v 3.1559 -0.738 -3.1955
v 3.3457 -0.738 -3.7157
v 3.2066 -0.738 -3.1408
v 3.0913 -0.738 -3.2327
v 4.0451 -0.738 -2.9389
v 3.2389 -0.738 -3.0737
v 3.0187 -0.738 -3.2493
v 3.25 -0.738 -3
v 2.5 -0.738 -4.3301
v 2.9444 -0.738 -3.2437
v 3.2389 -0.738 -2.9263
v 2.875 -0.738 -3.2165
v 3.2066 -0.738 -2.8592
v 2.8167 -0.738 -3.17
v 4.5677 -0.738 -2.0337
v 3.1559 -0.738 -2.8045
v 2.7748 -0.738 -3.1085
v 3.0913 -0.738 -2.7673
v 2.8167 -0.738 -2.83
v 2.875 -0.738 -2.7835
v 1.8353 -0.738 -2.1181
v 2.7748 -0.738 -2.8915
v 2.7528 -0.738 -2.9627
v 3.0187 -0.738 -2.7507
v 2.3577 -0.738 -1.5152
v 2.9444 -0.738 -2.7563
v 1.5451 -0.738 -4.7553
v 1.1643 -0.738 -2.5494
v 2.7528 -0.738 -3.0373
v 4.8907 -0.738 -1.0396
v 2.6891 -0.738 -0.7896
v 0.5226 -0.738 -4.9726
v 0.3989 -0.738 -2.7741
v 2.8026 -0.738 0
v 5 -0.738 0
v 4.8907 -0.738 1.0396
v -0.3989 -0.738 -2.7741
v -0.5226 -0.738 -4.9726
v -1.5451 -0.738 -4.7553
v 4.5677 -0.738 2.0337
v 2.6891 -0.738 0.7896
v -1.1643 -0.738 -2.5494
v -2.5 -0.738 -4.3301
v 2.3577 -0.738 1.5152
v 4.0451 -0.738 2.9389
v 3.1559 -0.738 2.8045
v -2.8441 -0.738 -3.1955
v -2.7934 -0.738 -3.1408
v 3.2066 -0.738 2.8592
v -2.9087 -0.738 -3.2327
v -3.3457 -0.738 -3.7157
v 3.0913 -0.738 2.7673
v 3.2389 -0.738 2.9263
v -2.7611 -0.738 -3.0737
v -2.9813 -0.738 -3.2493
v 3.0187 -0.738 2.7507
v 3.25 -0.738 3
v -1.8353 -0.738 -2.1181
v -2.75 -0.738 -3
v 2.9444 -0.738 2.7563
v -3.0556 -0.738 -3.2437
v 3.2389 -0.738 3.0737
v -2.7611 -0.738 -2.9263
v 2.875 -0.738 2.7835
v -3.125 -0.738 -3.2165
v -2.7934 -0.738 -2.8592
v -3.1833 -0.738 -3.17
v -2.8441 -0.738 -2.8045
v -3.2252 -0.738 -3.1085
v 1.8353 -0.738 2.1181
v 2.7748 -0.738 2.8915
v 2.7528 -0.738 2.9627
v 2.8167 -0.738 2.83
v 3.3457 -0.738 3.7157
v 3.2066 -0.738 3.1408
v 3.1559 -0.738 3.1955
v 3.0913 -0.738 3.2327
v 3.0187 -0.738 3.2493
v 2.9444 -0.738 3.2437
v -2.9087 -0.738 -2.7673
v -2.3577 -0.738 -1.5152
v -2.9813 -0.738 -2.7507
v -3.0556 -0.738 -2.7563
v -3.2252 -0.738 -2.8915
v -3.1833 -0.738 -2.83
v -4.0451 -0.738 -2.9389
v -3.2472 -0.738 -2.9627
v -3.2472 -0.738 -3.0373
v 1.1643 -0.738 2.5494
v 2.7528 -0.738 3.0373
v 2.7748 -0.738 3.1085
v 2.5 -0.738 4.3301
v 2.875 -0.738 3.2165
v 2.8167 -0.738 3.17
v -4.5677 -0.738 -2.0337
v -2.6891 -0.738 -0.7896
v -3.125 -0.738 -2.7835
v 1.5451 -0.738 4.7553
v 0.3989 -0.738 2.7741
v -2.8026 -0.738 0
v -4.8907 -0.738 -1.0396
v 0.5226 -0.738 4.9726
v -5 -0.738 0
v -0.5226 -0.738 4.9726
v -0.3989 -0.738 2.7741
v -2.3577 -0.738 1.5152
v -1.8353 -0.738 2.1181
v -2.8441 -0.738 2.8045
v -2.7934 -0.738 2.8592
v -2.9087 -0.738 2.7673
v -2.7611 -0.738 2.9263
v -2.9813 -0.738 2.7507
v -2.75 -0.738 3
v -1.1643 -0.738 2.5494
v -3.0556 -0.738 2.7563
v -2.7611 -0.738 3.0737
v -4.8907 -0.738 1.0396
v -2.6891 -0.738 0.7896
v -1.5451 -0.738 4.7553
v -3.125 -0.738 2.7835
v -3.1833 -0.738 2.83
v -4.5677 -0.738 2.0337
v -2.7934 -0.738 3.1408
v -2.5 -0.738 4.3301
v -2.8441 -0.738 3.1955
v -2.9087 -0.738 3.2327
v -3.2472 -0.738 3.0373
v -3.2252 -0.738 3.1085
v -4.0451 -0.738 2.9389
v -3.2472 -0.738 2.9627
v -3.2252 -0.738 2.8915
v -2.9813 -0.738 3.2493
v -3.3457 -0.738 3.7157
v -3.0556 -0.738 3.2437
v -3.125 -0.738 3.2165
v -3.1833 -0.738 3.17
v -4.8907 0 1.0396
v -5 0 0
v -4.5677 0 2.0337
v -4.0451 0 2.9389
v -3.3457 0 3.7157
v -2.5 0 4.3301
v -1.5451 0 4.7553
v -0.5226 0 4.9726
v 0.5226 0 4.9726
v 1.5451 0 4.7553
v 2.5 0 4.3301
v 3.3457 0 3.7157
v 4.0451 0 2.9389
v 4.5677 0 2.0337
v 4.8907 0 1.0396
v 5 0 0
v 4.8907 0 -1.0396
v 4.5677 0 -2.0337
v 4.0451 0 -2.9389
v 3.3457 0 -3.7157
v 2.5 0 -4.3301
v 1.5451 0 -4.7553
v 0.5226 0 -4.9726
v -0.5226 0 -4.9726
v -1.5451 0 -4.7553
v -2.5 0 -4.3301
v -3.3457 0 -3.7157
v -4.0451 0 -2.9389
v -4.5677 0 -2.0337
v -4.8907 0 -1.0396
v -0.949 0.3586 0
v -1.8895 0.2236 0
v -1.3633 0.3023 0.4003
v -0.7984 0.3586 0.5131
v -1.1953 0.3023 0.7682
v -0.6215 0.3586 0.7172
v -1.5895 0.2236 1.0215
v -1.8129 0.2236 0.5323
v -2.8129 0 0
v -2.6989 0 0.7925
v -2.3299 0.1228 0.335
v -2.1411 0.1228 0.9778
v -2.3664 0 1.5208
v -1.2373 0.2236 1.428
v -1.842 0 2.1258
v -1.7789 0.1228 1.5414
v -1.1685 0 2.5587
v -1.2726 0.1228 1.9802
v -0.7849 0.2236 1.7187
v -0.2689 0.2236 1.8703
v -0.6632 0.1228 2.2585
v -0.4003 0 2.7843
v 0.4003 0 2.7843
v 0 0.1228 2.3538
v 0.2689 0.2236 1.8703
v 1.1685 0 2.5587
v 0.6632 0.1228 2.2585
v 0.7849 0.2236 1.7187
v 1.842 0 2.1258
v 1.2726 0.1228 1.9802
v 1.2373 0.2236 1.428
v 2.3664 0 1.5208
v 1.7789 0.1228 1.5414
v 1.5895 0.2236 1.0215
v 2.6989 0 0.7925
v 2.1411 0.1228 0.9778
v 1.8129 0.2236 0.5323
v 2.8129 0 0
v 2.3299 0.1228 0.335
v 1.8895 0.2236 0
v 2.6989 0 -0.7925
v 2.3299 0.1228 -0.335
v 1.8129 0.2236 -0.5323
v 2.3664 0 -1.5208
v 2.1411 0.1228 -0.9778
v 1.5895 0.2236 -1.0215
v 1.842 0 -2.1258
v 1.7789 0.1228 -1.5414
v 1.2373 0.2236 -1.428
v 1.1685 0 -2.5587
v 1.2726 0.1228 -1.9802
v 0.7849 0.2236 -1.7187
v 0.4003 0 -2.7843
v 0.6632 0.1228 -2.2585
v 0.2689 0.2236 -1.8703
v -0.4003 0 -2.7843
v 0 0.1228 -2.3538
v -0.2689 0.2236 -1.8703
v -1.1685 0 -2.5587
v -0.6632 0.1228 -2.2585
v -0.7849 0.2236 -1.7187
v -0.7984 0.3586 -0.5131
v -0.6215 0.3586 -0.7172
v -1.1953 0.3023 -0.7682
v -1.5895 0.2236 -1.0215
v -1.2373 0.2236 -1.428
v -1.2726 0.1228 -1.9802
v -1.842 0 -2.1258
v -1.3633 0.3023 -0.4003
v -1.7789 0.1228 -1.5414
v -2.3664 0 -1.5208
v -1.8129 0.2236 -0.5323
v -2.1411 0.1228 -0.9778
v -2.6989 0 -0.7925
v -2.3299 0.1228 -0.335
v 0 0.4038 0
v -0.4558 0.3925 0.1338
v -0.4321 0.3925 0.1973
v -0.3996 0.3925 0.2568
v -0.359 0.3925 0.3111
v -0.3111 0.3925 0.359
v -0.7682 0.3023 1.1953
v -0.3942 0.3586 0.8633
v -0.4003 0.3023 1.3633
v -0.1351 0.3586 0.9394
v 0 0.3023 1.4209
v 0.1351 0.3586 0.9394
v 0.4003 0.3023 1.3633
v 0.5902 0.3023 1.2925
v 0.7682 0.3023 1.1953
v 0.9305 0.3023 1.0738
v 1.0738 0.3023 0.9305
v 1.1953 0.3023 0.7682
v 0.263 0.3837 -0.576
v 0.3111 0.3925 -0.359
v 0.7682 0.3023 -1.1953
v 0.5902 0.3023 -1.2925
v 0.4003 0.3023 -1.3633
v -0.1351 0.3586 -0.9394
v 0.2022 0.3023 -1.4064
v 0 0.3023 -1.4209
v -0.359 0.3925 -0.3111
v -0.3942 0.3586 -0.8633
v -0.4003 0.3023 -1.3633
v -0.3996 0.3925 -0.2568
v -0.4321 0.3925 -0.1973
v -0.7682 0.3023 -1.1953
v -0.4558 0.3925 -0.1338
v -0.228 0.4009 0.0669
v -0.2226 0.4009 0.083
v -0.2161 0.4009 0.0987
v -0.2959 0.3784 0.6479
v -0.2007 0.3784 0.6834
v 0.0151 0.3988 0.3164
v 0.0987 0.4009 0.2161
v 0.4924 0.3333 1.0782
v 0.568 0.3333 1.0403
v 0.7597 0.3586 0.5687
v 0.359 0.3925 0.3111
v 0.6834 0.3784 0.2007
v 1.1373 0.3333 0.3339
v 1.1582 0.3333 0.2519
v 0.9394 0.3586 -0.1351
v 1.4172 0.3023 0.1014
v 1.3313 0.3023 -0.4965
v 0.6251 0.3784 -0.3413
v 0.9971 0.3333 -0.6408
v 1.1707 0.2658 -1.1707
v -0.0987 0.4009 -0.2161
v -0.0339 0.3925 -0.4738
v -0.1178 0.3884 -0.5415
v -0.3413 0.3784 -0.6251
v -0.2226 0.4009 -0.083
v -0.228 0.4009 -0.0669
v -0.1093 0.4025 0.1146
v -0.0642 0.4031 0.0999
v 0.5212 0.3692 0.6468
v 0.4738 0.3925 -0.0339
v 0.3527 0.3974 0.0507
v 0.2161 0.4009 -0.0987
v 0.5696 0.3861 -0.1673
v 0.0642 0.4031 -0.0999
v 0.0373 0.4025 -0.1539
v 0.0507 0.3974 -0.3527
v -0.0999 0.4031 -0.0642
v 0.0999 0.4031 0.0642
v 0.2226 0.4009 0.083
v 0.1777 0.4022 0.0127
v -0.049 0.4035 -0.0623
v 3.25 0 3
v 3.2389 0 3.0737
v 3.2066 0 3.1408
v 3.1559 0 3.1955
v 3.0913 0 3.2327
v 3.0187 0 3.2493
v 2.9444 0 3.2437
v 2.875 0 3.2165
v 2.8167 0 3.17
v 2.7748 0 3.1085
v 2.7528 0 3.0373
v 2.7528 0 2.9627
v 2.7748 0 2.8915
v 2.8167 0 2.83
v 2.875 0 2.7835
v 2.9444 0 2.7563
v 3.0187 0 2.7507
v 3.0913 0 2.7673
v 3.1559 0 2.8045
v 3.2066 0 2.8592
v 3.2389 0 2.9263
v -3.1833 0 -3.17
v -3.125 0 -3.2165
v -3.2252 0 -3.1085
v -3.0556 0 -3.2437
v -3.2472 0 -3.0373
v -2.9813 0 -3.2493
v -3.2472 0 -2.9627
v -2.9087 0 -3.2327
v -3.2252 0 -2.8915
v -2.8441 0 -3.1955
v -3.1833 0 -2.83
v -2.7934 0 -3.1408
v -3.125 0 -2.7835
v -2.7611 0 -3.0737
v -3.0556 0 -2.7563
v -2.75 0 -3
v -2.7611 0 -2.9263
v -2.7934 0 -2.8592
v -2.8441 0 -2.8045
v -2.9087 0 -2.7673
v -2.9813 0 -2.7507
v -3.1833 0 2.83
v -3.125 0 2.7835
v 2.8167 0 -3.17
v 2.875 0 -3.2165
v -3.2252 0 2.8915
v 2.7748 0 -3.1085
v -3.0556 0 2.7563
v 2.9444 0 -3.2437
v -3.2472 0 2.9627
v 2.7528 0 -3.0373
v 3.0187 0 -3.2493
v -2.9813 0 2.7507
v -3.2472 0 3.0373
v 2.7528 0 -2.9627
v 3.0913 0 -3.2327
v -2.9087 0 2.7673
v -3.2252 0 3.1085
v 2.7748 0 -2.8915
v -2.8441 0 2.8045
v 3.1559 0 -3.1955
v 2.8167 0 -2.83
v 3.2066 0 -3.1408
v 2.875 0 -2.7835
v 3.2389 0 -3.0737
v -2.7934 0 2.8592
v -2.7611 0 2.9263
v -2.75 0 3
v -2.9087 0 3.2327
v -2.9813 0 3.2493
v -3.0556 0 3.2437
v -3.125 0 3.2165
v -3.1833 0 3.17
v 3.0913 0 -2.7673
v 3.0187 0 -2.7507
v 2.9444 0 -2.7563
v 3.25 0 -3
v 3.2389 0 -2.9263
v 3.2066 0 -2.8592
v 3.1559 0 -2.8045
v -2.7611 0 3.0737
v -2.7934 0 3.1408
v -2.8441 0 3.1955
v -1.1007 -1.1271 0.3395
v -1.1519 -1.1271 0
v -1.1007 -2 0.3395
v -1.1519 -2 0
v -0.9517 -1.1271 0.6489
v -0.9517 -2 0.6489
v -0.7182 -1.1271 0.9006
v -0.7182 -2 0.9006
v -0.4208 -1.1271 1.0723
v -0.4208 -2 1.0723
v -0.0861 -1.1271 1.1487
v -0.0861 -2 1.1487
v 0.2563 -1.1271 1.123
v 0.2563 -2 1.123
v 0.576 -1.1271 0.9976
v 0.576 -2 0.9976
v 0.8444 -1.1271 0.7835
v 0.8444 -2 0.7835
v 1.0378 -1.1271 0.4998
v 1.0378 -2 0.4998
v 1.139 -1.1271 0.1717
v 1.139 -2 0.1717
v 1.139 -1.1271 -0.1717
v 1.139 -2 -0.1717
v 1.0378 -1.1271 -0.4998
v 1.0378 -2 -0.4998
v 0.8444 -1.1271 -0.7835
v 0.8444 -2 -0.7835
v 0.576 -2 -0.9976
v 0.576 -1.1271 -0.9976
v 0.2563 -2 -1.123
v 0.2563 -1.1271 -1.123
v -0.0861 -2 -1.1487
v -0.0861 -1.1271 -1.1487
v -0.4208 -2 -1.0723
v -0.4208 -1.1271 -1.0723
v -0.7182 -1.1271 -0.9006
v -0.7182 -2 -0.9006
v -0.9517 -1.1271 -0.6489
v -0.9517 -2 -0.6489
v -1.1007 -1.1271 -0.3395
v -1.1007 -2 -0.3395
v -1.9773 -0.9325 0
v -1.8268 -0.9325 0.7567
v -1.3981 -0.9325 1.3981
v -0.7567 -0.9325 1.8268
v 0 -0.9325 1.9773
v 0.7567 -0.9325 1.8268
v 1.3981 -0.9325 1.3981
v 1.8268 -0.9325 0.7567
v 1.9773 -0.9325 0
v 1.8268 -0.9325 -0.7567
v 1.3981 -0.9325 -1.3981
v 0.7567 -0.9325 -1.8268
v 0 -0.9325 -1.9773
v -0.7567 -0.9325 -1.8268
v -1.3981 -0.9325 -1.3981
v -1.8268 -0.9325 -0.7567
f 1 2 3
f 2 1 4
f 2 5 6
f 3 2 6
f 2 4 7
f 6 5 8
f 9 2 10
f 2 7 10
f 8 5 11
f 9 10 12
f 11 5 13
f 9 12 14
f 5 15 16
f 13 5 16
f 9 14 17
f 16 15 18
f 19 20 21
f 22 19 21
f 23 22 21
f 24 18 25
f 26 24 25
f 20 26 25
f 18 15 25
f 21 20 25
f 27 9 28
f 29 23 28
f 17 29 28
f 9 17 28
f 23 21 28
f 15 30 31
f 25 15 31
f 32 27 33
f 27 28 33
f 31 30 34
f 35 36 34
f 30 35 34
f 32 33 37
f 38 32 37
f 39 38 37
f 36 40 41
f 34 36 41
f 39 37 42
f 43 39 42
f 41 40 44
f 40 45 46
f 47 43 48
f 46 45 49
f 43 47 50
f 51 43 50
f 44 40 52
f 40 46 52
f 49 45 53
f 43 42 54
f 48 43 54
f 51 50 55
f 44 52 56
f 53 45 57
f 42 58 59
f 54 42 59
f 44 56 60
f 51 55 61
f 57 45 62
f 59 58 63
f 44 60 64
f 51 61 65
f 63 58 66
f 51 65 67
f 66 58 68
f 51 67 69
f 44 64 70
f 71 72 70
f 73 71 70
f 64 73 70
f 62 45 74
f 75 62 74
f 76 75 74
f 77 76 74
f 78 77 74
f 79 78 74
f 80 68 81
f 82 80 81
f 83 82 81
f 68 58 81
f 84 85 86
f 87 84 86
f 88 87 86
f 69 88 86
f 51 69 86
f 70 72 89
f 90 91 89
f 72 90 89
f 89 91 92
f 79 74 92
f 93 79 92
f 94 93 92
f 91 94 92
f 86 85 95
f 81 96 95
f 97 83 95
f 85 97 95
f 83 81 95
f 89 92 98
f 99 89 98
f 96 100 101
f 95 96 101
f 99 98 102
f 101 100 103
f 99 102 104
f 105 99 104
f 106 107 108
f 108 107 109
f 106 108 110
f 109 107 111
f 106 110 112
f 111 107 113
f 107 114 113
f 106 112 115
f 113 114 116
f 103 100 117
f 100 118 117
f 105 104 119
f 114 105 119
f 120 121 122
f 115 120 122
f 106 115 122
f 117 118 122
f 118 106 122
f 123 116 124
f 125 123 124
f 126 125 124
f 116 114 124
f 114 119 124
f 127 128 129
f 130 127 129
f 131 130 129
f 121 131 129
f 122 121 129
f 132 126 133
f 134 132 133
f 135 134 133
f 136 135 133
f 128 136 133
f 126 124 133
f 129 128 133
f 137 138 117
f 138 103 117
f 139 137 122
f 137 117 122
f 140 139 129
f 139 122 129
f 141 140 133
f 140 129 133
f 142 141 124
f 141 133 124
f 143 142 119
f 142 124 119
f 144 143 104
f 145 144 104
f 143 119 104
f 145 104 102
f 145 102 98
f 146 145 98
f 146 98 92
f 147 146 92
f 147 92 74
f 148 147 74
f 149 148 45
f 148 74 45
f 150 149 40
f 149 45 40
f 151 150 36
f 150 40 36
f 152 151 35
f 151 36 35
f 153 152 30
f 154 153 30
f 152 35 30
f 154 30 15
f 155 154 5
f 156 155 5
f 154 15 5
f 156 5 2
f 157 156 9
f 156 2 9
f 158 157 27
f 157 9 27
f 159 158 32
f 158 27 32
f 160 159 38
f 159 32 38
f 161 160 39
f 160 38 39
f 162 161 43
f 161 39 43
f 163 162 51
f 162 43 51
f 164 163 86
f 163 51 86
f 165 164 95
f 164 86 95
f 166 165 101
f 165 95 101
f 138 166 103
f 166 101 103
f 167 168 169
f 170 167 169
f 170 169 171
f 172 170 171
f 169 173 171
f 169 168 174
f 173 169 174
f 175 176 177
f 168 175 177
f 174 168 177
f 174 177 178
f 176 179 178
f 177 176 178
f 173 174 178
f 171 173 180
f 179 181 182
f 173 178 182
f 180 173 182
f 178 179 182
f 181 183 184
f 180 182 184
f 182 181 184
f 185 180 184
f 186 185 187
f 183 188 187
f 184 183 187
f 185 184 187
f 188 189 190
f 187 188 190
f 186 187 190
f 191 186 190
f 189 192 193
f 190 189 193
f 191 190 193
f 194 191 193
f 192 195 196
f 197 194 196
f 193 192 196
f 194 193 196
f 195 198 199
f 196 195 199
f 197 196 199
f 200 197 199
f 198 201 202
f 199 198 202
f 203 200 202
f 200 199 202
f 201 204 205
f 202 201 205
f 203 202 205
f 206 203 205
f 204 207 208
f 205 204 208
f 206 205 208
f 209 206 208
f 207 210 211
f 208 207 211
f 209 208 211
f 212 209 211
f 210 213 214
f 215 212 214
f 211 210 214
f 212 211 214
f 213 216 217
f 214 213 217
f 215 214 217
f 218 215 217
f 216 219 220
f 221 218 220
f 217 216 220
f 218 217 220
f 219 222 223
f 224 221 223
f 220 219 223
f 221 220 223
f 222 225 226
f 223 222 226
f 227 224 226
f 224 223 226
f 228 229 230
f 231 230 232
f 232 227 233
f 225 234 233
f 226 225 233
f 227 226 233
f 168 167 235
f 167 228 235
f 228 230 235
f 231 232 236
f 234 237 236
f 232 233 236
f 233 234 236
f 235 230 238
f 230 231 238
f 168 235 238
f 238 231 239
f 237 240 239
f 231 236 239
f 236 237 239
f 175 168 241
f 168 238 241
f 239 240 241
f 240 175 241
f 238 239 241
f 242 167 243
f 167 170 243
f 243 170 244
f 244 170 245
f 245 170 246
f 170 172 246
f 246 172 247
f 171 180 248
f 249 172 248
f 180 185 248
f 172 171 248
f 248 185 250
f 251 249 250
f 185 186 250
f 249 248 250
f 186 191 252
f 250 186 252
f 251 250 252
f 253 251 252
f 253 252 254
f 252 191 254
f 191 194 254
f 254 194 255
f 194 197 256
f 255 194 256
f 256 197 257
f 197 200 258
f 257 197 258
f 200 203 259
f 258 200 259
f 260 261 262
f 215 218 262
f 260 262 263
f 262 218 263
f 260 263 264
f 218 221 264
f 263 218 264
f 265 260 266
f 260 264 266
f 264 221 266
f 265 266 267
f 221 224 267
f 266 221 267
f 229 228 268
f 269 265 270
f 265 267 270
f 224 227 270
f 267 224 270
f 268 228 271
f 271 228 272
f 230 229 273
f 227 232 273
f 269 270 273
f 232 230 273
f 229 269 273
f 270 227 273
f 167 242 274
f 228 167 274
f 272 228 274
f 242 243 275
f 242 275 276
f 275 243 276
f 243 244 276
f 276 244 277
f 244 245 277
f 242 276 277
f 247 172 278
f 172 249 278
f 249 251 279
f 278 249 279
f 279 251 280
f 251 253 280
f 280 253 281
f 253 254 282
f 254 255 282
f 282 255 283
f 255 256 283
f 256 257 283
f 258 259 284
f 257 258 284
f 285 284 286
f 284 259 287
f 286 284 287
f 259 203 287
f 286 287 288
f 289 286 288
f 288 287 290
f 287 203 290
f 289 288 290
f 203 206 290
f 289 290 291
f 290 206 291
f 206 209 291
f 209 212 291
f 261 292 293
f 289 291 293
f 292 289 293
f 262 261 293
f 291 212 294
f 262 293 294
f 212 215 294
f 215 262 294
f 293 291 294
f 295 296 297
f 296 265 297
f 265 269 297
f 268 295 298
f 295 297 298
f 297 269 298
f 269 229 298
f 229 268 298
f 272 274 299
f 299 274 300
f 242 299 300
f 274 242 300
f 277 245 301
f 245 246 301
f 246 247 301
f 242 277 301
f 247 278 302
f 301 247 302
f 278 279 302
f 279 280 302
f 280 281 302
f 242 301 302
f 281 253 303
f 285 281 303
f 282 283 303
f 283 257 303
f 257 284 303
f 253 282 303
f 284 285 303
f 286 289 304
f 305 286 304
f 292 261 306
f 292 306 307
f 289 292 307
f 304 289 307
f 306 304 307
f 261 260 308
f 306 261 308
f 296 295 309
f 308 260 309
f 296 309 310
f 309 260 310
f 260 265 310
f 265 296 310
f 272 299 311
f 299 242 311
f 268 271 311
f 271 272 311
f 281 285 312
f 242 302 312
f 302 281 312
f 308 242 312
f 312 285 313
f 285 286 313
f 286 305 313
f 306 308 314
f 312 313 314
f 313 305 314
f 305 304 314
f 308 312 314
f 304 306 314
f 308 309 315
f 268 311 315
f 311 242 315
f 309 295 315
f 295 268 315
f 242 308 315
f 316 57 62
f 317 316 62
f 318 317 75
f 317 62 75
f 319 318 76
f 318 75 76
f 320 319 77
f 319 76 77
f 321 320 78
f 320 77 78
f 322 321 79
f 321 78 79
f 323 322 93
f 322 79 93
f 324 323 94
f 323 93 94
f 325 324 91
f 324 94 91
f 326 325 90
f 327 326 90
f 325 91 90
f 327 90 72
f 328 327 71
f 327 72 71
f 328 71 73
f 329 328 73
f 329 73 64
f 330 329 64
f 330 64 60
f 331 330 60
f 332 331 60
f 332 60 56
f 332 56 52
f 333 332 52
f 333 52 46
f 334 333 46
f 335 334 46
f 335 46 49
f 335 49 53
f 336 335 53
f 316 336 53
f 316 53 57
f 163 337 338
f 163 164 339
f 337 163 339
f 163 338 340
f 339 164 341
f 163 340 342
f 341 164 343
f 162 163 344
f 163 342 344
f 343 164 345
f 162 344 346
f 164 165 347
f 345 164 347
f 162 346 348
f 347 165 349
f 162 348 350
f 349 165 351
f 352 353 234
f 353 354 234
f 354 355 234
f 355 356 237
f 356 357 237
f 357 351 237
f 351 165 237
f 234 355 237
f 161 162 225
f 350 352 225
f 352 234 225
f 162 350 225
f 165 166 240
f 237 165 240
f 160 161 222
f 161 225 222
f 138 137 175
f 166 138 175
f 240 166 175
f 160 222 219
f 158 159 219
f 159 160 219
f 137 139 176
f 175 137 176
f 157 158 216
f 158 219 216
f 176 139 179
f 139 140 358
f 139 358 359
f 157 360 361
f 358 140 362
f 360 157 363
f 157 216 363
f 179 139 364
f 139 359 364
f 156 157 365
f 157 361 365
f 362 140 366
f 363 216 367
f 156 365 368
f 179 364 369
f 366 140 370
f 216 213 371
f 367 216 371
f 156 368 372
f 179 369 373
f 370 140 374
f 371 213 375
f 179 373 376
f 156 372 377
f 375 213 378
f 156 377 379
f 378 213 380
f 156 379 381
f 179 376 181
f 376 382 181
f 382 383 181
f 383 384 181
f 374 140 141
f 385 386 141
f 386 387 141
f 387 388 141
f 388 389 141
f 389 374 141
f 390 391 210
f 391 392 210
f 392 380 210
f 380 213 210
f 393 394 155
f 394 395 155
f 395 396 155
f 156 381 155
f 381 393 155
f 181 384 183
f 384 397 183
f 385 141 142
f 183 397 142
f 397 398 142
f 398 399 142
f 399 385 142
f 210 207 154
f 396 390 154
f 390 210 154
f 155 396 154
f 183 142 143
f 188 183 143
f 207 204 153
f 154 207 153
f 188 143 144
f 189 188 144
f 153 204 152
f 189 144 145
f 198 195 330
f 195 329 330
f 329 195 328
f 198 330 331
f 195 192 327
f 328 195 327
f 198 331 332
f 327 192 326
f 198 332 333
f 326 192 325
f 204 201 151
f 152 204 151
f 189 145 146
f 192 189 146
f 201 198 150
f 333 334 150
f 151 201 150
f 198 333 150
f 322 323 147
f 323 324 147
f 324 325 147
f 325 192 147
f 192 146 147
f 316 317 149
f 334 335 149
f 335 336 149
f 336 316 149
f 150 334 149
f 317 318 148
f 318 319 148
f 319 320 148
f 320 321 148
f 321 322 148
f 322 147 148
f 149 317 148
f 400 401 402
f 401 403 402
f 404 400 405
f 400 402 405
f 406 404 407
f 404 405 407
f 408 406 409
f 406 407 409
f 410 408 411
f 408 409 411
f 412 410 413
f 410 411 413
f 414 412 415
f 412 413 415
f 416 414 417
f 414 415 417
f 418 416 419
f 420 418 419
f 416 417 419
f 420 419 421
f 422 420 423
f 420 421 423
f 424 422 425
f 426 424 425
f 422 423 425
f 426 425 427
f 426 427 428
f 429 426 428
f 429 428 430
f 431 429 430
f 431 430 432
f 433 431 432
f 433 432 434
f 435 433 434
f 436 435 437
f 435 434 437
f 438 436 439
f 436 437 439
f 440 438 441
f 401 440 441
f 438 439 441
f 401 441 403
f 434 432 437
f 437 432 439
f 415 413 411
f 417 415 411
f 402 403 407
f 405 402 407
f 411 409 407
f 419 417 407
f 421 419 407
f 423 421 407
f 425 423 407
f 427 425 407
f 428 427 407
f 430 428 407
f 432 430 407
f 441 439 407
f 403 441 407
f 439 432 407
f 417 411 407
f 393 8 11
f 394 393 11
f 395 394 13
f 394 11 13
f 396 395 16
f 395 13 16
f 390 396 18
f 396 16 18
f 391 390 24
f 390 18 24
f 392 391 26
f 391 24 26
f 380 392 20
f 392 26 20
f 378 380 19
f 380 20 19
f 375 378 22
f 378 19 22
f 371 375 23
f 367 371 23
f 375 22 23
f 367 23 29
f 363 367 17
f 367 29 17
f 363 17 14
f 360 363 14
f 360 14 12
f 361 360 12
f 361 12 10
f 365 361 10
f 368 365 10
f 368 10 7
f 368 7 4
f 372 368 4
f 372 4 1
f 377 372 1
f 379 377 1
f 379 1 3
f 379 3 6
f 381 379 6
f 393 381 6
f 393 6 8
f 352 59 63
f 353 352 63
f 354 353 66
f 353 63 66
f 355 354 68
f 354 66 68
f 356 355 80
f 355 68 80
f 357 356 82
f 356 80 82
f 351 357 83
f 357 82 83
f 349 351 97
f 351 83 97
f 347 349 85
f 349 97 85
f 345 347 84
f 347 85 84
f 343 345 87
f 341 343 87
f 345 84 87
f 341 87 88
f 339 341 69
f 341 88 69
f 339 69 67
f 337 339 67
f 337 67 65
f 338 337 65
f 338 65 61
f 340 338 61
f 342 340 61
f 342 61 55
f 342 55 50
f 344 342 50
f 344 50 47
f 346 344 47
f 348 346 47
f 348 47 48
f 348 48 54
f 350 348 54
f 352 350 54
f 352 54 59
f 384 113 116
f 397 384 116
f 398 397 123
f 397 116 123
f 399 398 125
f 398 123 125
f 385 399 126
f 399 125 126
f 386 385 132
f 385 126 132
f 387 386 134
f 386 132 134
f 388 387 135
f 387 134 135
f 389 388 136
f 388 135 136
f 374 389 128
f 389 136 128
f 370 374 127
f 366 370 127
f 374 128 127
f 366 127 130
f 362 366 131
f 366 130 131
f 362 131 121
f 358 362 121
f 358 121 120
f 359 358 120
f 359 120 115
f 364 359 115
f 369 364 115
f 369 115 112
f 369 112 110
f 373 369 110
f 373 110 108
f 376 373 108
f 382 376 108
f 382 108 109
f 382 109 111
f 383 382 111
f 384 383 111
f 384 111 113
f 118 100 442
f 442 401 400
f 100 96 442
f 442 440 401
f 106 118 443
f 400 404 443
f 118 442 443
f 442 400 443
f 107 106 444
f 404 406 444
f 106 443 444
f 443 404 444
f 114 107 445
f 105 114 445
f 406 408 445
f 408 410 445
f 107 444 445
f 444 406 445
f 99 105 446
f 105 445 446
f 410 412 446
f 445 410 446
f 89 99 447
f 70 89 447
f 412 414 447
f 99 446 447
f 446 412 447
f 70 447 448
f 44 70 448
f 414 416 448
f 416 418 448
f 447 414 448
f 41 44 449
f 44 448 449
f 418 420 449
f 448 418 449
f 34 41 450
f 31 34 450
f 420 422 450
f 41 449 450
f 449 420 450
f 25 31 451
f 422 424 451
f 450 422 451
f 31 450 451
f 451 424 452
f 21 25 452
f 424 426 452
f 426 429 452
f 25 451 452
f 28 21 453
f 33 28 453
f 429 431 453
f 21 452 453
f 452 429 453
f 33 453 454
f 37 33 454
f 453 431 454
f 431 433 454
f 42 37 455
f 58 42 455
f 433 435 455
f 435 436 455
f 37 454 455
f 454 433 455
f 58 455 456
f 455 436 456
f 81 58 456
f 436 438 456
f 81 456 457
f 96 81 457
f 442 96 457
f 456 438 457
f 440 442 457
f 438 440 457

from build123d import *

# Parameters (mm, degrees)
F2_R     = 0.25
F3_DEPTH = 25


with BuildPart() as f1:
    # F0 (on Top) → F1 (revolve)
    with BuildSketch(Plane.XY):
        with BuildLine():
            Line((0, -2), (0, 0.403768))
            ThreePointArc((0, 0.403768), (-1.42086, 0.302312), (-2.812888, 0))
            Line((-2.812888, 0), (-5, 0))
            Line((-5, 0), (-5, -0.738022))
            Line((-5, -0.738022), (-2.802643, -0.738022))
            Line((-2.802643, -0.738022), (-1.151906, -1.127067))
            Line((-1.151906, -1.127067), (-1.151906, -2))
            Line((-1.151906, -2), (0, -2))
        make_face()
    revolve(axis=Axis((0, -0.798116, 0), (0, 1, 0)))

    # F2 (on face) → F3 (cut)
    with BuildSketch(Plane.XZ.offset(0.738022)):
        with Locations((3, 3)):
            Circle(F2_R)
        with Locations((-3, 3)):
            Circle(F2_R)
        with Locations((-3, -3)):
            Circle(F2_R)
        with Locations((3, -3)):
            Circle(F2_R)
    extrude(amount=-F3_DEPTH, mode=Mode.SUBTRACT)


solid = f1.part
